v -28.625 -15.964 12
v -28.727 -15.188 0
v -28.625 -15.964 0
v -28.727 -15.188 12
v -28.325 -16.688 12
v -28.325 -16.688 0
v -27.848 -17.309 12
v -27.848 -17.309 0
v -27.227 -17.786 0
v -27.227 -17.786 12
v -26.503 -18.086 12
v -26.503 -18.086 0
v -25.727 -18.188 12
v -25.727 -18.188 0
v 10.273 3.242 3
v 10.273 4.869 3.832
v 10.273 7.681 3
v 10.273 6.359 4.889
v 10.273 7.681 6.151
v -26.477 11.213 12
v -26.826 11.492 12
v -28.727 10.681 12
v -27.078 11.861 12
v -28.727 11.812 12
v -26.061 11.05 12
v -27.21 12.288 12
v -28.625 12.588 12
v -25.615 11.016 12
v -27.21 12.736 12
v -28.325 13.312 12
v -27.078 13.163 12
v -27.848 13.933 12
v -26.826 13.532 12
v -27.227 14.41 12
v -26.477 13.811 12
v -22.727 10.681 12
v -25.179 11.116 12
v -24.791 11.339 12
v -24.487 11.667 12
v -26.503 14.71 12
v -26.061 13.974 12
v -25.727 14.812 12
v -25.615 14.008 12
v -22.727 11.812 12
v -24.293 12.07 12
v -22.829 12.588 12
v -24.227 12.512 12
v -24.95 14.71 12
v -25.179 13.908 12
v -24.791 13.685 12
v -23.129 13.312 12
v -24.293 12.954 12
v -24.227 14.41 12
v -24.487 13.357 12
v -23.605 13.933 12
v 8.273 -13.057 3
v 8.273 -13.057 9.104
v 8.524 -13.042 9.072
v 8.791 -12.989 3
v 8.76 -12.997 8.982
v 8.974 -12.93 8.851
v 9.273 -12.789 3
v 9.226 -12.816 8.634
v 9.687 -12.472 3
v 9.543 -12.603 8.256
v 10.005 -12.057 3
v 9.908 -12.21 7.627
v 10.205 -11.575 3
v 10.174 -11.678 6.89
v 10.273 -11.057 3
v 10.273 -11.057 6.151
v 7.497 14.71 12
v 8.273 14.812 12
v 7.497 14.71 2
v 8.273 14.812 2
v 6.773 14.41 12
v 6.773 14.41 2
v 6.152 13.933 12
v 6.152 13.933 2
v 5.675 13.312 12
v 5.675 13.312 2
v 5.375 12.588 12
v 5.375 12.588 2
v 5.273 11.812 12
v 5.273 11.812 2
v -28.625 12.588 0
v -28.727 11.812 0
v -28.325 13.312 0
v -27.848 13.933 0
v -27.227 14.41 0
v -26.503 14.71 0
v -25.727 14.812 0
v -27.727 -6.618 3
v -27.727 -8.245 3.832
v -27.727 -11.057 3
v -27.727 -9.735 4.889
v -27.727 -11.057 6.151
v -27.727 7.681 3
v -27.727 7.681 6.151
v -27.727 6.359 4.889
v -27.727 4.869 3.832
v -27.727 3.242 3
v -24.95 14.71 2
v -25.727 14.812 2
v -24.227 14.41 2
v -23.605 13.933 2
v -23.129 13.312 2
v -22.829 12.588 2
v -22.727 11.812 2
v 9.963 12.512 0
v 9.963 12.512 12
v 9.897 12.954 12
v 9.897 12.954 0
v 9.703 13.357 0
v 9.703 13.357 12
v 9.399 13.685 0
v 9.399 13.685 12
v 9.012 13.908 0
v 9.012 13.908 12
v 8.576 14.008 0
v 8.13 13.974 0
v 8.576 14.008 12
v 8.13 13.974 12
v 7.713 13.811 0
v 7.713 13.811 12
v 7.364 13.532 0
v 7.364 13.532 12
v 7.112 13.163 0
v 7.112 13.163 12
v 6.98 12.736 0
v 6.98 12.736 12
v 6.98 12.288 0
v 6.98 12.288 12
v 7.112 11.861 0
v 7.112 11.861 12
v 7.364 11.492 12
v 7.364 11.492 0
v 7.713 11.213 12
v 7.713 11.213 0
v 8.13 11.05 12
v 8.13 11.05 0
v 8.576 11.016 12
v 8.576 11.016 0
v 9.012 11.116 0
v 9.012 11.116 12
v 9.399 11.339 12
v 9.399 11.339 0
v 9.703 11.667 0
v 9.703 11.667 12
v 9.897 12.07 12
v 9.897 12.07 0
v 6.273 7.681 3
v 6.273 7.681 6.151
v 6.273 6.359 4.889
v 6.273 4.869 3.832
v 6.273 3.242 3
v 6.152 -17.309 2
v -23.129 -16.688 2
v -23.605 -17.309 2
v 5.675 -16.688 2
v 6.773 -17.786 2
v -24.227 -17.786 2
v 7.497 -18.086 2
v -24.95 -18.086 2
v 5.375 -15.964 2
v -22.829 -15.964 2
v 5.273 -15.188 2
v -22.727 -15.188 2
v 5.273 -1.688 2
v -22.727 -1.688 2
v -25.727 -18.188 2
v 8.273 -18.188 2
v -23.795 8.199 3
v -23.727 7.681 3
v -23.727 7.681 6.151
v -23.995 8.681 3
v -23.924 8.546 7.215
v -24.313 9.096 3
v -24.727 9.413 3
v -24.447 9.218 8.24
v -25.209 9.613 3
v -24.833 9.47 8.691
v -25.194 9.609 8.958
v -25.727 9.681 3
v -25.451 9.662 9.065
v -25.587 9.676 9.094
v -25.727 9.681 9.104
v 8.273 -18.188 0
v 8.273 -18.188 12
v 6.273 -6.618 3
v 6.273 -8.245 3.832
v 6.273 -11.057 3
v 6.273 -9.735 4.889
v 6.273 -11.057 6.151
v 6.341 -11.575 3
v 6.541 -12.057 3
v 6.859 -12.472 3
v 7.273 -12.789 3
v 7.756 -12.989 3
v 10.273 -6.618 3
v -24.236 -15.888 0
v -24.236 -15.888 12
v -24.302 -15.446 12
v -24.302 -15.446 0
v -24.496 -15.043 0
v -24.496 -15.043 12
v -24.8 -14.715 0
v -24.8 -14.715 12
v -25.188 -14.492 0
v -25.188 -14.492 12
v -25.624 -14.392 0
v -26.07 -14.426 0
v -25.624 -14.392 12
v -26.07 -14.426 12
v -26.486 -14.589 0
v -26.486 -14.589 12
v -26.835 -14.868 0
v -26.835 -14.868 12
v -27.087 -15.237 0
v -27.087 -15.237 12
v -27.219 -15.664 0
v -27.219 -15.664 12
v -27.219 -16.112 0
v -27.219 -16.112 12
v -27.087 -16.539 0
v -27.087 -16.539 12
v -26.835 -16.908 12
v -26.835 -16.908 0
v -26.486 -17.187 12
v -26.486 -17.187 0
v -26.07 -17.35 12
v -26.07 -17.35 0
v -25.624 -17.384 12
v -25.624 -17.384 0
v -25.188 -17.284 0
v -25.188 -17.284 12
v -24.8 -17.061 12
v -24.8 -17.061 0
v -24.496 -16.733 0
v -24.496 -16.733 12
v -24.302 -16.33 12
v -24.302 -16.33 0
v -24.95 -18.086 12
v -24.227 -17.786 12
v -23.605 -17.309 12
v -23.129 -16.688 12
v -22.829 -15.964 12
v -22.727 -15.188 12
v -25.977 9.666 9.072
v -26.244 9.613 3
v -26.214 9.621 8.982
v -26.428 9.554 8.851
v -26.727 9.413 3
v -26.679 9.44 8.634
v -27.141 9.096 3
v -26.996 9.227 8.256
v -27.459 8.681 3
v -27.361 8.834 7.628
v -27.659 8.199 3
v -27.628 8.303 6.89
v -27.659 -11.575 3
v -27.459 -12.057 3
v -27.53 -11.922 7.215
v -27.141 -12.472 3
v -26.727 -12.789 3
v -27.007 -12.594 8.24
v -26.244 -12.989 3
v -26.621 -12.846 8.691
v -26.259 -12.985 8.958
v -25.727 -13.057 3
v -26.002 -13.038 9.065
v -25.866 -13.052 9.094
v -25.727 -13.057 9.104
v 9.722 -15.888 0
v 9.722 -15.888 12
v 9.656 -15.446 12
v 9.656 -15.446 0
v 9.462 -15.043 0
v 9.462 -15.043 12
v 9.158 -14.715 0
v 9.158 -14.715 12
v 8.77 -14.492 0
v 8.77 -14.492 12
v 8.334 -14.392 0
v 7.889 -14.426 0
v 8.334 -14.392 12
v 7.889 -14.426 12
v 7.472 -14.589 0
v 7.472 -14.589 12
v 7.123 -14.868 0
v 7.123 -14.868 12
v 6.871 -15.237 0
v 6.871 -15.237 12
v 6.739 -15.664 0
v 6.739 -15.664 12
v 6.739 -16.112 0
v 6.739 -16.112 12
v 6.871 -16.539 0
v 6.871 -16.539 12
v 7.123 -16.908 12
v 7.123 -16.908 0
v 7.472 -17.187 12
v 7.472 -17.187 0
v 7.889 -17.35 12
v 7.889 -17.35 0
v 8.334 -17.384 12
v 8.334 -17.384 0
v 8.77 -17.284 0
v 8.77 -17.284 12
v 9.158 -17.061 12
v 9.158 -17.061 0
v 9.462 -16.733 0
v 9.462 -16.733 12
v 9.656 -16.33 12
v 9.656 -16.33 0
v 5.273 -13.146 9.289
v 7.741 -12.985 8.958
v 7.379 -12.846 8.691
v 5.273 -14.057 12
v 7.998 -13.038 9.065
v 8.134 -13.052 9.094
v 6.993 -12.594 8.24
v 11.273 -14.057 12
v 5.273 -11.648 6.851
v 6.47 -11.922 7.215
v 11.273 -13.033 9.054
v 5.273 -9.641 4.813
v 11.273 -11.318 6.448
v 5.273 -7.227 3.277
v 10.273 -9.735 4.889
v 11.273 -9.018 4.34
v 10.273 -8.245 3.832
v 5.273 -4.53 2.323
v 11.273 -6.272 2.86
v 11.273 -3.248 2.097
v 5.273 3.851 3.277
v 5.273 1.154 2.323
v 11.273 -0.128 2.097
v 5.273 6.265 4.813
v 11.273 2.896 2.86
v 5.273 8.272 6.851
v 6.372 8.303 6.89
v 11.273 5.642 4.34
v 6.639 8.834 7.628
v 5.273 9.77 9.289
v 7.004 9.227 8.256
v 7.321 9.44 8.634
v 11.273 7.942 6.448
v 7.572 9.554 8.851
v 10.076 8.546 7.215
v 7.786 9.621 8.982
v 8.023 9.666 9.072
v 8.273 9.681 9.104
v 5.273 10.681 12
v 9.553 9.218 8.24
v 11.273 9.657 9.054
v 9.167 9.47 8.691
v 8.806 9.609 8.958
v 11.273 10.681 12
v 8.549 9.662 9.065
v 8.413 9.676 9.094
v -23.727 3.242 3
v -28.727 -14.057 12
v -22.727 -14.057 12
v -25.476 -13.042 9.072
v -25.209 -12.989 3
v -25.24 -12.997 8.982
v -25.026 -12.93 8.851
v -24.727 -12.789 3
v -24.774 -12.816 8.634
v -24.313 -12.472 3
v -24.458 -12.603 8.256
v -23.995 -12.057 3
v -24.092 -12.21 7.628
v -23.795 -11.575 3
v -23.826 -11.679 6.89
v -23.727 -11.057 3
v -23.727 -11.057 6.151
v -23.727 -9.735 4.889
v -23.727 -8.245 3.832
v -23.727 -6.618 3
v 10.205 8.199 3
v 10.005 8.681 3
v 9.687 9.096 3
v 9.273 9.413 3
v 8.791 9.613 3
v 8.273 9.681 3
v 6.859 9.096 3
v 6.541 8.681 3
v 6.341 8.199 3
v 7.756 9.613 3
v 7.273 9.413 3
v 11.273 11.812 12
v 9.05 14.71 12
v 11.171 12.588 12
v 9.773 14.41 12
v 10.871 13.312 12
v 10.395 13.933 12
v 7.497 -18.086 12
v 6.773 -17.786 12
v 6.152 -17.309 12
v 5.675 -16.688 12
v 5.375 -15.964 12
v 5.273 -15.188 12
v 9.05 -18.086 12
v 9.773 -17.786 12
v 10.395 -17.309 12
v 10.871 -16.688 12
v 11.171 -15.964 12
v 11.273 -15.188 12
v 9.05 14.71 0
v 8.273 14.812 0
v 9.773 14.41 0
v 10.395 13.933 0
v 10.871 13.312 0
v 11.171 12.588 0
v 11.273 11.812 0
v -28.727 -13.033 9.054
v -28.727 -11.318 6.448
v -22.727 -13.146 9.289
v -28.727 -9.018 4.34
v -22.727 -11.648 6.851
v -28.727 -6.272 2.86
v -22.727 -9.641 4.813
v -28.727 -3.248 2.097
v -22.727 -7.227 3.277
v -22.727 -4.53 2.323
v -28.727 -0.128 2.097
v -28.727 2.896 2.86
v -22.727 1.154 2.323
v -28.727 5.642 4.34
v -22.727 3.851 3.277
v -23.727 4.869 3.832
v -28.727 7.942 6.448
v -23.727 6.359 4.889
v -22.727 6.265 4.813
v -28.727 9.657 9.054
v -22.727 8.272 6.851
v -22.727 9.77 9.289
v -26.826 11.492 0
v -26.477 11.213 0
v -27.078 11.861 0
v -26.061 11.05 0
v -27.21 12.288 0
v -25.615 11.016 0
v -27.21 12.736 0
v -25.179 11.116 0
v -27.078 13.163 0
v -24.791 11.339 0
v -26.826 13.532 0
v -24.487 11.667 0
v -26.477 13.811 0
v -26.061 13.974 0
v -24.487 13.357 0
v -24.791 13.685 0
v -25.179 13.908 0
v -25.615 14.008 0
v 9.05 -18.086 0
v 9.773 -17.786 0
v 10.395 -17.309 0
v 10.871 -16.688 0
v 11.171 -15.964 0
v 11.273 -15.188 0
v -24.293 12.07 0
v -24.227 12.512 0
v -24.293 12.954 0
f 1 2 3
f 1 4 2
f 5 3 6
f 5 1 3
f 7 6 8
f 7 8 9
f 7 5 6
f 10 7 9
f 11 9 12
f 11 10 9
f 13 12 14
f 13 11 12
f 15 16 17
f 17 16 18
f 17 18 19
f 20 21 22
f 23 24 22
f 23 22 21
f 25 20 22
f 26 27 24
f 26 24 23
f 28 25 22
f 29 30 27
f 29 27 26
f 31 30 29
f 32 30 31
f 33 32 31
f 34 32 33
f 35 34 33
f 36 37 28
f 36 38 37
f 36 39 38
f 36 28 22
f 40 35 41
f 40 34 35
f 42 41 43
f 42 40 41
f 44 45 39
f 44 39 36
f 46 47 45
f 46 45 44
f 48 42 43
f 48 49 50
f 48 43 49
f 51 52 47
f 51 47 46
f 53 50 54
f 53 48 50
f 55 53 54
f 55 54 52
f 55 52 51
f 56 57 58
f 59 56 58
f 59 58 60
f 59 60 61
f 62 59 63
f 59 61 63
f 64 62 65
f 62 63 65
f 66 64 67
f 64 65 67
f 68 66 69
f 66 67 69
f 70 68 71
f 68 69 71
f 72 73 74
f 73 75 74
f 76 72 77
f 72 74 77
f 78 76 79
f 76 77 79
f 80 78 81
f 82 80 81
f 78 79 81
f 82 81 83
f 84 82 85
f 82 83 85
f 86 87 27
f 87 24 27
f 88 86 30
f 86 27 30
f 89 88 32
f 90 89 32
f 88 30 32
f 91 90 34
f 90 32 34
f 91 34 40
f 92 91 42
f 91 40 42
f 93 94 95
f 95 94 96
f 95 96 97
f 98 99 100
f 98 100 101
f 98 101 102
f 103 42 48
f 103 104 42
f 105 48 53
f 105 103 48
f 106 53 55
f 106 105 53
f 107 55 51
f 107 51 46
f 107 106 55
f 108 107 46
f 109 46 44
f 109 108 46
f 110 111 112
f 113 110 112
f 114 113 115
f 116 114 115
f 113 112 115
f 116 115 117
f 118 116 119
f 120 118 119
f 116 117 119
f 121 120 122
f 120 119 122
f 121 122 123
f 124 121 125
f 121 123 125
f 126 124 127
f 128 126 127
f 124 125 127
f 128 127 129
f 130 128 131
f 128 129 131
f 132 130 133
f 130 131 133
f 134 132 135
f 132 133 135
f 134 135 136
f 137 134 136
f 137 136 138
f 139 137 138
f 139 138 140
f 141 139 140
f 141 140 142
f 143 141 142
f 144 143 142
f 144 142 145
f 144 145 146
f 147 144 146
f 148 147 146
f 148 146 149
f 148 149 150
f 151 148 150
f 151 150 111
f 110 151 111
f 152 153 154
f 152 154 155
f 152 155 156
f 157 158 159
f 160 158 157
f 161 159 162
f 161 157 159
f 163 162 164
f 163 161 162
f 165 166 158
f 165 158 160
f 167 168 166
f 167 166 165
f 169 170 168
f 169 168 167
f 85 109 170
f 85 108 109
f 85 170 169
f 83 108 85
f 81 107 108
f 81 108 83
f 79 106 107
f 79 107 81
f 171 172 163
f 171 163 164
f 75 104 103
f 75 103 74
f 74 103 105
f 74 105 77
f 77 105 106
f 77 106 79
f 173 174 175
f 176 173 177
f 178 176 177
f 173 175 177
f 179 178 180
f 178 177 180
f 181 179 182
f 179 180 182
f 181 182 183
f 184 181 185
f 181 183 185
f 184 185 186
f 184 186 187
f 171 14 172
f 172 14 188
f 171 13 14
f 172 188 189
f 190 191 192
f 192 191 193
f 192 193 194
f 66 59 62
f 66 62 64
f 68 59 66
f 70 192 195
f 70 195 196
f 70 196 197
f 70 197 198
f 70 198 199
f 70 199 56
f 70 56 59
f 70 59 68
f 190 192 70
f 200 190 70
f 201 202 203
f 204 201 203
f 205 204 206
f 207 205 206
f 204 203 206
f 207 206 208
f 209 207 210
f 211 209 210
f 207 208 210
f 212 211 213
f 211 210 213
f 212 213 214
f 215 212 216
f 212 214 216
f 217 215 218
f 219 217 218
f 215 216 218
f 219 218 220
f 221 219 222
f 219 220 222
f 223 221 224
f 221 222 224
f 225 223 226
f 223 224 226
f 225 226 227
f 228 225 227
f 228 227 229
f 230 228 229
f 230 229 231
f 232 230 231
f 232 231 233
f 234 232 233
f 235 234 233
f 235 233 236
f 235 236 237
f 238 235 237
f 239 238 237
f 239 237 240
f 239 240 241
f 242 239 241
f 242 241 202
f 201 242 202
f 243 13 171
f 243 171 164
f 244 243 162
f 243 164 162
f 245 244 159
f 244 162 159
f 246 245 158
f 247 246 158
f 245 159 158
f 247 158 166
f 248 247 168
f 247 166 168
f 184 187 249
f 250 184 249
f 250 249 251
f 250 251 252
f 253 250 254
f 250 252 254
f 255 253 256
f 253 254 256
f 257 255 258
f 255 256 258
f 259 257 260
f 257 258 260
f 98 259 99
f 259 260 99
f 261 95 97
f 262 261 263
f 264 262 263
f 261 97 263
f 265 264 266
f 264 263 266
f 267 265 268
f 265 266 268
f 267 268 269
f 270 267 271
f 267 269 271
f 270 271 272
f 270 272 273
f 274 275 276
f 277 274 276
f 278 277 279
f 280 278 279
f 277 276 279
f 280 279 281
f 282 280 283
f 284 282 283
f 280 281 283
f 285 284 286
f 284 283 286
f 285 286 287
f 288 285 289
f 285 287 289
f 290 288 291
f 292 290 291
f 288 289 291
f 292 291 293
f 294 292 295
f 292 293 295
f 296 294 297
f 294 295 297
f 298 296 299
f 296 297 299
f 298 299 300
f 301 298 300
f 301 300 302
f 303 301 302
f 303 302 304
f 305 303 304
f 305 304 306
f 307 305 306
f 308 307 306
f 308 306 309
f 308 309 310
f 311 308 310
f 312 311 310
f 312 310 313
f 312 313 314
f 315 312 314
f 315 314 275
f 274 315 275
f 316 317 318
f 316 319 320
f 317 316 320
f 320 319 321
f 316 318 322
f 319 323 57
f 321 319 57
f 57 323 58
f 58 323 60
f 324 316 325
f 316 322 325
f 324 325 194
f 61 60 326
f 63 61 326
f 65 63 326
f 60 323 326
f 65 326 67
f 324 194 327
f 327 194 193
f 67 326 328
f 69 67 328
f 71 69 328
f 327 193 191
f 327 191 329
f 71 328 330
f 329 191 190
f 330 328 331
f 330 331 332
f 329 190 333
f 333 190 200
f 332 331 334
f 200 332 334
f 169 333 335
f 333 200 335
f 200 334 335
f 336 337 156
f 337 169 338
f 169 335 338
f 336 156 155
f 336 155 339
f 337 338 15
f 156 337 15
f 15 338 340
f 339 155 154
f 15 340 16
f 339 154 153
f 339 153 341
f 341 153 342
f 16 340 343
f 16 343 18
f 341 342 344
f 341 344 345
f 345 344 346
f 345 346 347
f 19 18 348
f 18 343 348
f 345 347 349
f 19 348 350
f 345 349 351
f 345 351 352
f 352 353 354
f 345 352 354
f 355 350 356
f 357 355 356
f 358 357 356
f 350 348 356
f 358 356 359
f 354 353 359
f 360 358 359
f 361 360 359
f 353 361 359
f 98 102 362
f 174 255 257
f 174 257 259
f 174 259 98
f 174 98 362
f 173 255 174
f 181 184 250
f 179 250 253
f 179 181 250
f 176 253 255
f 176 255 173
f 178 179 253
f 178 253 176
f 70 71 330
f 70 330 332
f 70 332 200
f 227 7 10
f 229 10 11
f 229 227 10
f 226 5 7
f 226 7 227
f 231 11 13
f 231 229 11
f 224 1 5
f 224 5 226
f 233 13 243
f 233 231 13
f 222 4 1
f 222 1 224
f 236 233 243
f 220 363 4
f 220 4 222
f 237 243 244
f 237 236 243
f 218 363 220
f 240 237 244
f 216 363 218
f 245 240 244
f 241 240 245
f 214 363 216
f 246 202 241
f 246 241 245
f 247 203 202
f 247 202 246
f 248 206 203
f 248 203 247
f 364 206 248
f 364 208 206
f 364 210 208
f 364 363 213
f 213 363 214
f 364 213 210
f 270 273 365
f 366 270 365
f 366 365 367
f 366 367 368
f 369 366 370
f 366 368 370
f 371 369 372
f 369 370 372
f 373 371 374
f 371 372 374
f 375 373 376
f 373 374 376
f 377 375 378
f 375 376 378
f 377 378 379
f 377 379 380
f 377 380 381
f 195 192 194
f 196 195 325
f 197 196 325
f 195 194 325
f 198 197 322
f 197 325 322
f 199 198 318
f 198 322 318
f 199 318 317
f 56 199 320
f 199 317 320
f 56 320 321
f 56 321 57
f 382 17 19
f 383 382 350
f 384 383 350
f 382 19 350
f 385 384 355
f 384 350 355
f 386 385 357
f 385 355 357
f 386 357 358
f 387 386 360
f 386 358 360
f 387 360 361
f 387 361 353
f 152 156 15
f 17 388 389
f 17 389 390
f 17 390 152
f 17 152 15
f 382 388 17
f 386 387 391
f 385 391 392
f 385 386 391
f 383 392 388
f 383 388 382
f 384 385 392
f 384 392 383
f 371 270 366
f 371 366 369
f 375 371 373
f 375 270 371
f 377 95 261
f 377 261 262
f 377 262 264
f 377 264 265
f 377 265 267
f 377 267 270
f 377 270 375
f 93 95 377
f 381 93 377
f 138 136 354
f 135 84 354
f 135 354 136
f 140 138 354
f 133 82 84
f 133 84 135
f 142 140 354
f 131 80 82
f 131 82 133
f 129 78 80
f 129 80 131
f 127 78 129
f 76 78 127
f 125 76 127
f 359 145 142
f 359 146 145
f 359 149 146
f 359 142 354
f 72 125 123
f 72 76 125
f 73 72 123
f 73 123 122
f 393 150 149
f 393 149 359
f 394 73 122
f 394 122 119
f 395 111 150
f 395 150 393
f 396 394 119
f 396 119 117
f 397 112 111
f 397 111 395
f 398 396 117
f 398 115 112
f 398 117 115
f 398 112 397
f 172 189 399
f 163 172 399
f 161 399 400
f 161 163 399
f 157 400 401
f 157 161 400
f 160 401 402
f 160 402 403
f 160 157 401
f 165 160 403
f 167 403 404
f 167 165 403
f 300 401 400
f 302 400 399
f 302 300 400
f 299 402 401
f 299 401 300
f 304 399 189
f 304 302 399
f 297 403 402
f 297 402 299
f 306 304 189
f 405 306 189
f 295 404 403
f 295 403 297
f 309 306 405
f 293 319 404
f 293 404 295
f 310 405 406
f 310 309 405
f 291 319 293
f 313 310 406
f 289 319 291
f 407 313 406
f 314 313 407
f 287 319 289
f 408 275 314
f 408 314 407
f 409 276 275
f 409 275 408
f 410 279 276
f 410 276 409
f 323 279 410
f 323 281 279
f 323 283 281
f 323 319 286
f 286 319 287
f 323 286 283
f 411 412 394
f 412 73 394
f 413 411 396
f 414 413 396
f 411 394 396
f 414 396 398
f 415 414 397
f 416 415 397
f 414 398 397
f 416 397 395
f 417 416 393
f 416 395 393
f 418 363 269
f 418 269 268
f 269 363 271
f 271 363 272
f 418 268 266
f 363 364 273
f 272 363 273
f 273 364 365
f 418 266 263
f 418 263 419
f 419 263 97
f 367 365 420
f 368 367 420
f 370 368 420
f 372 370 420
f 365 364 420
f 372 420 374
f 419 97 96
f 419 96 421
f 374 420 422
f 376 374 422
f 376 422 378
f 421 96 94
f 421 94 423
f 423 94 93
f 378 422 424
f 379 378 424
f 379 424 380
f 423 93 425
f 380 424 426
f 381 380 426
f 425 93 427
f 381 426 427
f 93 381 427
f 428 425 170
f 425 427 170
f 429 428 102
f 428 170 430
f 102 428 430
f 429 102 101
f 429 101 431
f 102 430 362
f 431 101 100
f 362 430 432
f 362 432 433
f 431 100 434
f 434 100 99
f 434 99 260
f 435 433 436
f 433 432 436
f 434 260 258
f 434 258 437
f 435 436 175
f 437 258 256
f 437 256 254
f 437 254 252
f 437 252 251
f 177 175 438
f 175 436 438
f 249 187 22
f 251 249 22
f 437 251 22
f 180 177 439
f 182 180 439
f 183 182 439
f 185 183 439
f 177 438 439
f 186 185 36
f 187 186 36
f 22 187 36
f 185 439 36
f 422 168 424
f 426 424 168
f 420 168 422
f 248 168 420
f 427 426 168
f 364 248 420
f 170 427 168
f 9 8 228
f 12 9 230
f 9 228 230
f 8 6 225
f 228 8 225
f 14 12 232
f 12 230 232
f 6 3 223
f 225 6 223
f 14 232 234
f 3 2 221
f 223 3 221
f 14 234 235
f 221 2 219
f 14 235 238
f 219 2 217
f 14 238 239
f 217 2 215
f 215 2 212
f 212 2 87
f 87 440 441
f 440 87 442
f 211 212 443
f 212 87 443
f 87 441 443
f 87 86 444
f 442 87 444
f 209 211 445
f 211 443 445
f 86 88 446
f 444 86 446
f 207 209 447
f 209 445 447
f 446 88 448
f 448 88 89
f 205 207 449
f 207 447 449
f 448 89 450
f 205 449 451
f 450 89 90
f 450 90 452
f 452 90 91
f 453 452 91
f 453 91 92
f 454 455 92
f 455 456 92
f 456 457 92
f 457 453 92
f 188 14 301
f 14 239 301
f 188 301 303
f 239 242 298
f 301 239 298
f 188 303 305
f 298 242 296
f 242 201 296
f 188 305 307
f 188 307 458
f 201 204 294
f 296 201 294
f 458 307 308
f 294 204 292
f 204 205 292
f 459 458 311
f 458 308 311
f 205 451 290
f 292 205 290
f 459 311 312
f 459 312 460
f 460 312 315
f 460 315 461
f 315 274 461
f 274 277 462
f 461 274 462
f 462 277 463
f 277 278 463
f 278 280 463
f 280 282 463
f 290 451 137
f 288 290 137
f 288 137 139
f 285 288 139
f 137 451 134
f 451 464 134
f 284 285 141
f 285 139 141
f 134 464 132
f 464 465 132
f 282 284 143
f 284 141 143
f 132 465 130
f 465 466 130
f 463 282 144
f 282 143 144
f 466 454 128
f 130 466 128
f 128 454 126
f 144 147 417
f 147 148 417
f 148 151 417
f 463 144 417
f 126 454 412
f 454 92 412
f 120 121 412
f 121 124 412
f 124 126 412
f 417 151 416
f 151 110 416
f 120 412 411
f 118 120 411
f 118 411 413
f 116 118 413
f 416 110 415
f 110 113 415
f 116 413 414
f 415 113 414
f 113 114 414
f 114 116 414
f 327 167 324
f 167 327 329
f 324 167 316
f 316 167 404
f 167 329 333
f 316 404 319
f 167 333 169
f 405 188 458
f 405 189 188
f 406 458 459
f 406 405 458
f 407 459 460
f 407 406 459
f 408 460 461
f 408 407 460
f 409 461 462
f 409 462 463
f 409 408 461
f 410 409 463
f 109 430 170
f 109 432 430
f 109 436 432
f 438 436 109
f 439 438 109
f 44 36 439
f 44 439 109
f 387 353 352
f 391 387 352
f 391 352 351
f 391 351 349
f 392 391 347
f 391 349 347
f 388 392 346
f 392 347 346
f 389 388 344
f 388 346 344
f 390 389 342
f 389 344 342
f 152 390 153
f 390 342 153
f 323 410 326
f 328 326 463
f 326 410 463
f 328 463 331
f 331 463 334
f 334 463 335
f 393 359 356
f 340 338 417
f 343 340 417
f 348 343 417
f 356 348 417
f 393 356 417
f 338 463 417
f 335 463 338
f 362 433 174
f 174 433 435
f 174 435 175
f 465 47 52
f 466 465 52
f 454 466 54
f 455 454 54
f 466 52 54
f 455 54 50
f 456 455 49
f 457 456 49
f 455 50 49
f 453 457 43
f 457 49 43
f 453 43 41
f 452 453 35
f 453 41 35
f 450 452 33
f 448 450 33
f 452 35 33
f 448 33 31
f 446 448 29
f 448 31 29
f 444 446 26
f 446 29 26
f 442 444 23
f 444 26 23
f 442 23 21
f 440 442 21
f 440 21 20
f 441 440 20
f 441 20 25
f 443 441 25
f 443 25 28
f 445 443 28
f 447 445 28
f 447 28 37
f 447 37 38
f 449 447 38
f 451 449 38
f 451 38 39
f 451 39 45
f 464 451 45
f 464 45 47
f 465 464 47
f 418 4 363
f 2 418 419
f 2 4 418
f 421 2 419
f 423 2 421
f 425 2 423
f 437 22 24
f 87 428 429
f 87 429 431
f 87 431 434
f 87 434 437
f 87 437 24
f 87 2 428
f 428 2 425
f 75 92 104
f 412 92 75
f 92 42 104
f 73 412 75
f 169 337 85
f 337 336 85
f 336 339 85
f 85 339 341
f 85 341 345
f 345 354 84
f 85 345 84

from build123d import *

# Parameters (mm, degrees)
F0_W      = 40
F0_H      = 33
F1_DEPTH  = 12
F2_R      = 12.65
F3_DEPTH  = 69
F4_W      = 28
F4_H      = 48.7952879344
F5_DEPTH  = 10
F7_DEPTH  = 9
F8_R      = 2.99999
F9_R      = 1.5
F10_DEPTH = 20


# Not quite as in the source:
# - a fillet or chamfer is up to 0.001 mm smaller than in the source, because OpenCascade refuses the exact size


with BuildPart() as f1:
    # F0 (on Top) → F1 (new body)
    with BuildSketch(Plane.XY):
        with Locations((-8.7267248217, -1.6879990697)):
            Rectangle(F0_W, F0_H)
    extrude(amount=F1_DEPTH)

    # F2 (on face) → F3 (cut)
    with BuildSketch(Plane.YZ.offset(11.2732751783)):
        with Locations((-1.6879990697, 14.65)):
            Circle(F2_R)
    extrude(amount=-F3_DEPTH, mode=Mode.SUBTRACT)

    # F4 (on face) → F5 (cut)
    with BuildSketch(Plane.XY.offset(12)):
        with Locations((-8.7267248217, 5.2832299843)):
            Rectangle(F4_W, F4_H)
    extrude(amount=-F5_DEPTH, mode=Mode.SUBTRACT)

    # F6 (on face) → F7 (cut)
    with BuildSketch(Plane.XY.offset(12)):
        with BuildLine():
            ThreePointArc((-25.7267248217, 9.6813178072), (-27.140938384, 9.0955313695), (-27.7267248217, 7.6813178072))
            Line((-27.7267248217, 7.6813178072), (-27.7267248217, -11.0573159465))
            ThreePointArc((-27.7267248217, -11.0573159465), (-27.140938384, -12.4715295089), (-25.7267248217, -13.0573159465))
            ThreePointArc((-25.7267248217, -13.0573159465), (-24.3125112593, -12.4715295089), (-23.7267248217, -11.0573159465))
            Line((-23.7267248217, -11.0573159465), (-23.7267248217, 7.6813178072))
            ThreePointArc((-23.7267248217, 7.6813178072), (-24.3125112593, 9.0955313695), (-25.7267248217, 9.6813178072))
        make_face()
        with BuildLine():
            ThreePointArc((8.2732751783, 9.6813178072), (6.859061616, 9.0955313695), (6.2732751783, 7.6813178072))
            Line((6.2732751783, 7.6813178072), (6.2732751783, -11.0573159465))
            ThreePointArc((6.2732751783, -11.0573159465), (6.859061616, -12.4715295089), (8.2732751783, -13.0573159465))
            ThreePointArc((8.2732751783, -13.0573159465), (9.6874887407, -12.4715295089), (10.2732751783, -11.0573159465))
            Line((10.2732751783, -11.0573159465), (10.2732751783, 7.6813178072))
            ThreePointArc((10.2732751783, 7.6813178072), (9.6874887407, 9.0955313695), (8.2732751783, 9.6813178072))
        make_face()
    extrude(amount=-F7_DEPTH, mode=Mode.SUBTRACT)

    # F8 (radius 3 in the source; OpenCascade refuses exactly that, so slightly less here)
    f8_edges = [f1.edges().sort_by_distance(p)[0] for p in [
        (5.273275, 14.812001, 7),
        (11.273275, 14.812001, 6),
        (-22.726725, 14.812001, 7),
        (-28.726725, 14.812001, 6),
        (-28.726725, -18.187999, 6),
        (-22.726725, -18.187999, 7),
        (5.273275, -18.187999, 7),
        (11.273275, -18.187999, 6),
    ]]
    fillet(f8_edges, radius=F8_R)

    # F9 (on face) → F10 (cut)
    with BuildSketch(Plane.XY.offset(12)):
        with Locations((-25.7267248217, 12.5120009303)):
            Circle(F9_R)
        with Locations((8.4634907544, 12.5120009303)):
            Circle(F9_R)
        with Locations((8.2223585095, -15.8879990697)):
            Circle(F9_R)
        with Locations((-25.7357346928, -15.8880167171)):
            Circle(F9_R)
    extrude(amount=-F10_DEPTH, mode=Mode.SUBTRACT)


solid = f1.part
